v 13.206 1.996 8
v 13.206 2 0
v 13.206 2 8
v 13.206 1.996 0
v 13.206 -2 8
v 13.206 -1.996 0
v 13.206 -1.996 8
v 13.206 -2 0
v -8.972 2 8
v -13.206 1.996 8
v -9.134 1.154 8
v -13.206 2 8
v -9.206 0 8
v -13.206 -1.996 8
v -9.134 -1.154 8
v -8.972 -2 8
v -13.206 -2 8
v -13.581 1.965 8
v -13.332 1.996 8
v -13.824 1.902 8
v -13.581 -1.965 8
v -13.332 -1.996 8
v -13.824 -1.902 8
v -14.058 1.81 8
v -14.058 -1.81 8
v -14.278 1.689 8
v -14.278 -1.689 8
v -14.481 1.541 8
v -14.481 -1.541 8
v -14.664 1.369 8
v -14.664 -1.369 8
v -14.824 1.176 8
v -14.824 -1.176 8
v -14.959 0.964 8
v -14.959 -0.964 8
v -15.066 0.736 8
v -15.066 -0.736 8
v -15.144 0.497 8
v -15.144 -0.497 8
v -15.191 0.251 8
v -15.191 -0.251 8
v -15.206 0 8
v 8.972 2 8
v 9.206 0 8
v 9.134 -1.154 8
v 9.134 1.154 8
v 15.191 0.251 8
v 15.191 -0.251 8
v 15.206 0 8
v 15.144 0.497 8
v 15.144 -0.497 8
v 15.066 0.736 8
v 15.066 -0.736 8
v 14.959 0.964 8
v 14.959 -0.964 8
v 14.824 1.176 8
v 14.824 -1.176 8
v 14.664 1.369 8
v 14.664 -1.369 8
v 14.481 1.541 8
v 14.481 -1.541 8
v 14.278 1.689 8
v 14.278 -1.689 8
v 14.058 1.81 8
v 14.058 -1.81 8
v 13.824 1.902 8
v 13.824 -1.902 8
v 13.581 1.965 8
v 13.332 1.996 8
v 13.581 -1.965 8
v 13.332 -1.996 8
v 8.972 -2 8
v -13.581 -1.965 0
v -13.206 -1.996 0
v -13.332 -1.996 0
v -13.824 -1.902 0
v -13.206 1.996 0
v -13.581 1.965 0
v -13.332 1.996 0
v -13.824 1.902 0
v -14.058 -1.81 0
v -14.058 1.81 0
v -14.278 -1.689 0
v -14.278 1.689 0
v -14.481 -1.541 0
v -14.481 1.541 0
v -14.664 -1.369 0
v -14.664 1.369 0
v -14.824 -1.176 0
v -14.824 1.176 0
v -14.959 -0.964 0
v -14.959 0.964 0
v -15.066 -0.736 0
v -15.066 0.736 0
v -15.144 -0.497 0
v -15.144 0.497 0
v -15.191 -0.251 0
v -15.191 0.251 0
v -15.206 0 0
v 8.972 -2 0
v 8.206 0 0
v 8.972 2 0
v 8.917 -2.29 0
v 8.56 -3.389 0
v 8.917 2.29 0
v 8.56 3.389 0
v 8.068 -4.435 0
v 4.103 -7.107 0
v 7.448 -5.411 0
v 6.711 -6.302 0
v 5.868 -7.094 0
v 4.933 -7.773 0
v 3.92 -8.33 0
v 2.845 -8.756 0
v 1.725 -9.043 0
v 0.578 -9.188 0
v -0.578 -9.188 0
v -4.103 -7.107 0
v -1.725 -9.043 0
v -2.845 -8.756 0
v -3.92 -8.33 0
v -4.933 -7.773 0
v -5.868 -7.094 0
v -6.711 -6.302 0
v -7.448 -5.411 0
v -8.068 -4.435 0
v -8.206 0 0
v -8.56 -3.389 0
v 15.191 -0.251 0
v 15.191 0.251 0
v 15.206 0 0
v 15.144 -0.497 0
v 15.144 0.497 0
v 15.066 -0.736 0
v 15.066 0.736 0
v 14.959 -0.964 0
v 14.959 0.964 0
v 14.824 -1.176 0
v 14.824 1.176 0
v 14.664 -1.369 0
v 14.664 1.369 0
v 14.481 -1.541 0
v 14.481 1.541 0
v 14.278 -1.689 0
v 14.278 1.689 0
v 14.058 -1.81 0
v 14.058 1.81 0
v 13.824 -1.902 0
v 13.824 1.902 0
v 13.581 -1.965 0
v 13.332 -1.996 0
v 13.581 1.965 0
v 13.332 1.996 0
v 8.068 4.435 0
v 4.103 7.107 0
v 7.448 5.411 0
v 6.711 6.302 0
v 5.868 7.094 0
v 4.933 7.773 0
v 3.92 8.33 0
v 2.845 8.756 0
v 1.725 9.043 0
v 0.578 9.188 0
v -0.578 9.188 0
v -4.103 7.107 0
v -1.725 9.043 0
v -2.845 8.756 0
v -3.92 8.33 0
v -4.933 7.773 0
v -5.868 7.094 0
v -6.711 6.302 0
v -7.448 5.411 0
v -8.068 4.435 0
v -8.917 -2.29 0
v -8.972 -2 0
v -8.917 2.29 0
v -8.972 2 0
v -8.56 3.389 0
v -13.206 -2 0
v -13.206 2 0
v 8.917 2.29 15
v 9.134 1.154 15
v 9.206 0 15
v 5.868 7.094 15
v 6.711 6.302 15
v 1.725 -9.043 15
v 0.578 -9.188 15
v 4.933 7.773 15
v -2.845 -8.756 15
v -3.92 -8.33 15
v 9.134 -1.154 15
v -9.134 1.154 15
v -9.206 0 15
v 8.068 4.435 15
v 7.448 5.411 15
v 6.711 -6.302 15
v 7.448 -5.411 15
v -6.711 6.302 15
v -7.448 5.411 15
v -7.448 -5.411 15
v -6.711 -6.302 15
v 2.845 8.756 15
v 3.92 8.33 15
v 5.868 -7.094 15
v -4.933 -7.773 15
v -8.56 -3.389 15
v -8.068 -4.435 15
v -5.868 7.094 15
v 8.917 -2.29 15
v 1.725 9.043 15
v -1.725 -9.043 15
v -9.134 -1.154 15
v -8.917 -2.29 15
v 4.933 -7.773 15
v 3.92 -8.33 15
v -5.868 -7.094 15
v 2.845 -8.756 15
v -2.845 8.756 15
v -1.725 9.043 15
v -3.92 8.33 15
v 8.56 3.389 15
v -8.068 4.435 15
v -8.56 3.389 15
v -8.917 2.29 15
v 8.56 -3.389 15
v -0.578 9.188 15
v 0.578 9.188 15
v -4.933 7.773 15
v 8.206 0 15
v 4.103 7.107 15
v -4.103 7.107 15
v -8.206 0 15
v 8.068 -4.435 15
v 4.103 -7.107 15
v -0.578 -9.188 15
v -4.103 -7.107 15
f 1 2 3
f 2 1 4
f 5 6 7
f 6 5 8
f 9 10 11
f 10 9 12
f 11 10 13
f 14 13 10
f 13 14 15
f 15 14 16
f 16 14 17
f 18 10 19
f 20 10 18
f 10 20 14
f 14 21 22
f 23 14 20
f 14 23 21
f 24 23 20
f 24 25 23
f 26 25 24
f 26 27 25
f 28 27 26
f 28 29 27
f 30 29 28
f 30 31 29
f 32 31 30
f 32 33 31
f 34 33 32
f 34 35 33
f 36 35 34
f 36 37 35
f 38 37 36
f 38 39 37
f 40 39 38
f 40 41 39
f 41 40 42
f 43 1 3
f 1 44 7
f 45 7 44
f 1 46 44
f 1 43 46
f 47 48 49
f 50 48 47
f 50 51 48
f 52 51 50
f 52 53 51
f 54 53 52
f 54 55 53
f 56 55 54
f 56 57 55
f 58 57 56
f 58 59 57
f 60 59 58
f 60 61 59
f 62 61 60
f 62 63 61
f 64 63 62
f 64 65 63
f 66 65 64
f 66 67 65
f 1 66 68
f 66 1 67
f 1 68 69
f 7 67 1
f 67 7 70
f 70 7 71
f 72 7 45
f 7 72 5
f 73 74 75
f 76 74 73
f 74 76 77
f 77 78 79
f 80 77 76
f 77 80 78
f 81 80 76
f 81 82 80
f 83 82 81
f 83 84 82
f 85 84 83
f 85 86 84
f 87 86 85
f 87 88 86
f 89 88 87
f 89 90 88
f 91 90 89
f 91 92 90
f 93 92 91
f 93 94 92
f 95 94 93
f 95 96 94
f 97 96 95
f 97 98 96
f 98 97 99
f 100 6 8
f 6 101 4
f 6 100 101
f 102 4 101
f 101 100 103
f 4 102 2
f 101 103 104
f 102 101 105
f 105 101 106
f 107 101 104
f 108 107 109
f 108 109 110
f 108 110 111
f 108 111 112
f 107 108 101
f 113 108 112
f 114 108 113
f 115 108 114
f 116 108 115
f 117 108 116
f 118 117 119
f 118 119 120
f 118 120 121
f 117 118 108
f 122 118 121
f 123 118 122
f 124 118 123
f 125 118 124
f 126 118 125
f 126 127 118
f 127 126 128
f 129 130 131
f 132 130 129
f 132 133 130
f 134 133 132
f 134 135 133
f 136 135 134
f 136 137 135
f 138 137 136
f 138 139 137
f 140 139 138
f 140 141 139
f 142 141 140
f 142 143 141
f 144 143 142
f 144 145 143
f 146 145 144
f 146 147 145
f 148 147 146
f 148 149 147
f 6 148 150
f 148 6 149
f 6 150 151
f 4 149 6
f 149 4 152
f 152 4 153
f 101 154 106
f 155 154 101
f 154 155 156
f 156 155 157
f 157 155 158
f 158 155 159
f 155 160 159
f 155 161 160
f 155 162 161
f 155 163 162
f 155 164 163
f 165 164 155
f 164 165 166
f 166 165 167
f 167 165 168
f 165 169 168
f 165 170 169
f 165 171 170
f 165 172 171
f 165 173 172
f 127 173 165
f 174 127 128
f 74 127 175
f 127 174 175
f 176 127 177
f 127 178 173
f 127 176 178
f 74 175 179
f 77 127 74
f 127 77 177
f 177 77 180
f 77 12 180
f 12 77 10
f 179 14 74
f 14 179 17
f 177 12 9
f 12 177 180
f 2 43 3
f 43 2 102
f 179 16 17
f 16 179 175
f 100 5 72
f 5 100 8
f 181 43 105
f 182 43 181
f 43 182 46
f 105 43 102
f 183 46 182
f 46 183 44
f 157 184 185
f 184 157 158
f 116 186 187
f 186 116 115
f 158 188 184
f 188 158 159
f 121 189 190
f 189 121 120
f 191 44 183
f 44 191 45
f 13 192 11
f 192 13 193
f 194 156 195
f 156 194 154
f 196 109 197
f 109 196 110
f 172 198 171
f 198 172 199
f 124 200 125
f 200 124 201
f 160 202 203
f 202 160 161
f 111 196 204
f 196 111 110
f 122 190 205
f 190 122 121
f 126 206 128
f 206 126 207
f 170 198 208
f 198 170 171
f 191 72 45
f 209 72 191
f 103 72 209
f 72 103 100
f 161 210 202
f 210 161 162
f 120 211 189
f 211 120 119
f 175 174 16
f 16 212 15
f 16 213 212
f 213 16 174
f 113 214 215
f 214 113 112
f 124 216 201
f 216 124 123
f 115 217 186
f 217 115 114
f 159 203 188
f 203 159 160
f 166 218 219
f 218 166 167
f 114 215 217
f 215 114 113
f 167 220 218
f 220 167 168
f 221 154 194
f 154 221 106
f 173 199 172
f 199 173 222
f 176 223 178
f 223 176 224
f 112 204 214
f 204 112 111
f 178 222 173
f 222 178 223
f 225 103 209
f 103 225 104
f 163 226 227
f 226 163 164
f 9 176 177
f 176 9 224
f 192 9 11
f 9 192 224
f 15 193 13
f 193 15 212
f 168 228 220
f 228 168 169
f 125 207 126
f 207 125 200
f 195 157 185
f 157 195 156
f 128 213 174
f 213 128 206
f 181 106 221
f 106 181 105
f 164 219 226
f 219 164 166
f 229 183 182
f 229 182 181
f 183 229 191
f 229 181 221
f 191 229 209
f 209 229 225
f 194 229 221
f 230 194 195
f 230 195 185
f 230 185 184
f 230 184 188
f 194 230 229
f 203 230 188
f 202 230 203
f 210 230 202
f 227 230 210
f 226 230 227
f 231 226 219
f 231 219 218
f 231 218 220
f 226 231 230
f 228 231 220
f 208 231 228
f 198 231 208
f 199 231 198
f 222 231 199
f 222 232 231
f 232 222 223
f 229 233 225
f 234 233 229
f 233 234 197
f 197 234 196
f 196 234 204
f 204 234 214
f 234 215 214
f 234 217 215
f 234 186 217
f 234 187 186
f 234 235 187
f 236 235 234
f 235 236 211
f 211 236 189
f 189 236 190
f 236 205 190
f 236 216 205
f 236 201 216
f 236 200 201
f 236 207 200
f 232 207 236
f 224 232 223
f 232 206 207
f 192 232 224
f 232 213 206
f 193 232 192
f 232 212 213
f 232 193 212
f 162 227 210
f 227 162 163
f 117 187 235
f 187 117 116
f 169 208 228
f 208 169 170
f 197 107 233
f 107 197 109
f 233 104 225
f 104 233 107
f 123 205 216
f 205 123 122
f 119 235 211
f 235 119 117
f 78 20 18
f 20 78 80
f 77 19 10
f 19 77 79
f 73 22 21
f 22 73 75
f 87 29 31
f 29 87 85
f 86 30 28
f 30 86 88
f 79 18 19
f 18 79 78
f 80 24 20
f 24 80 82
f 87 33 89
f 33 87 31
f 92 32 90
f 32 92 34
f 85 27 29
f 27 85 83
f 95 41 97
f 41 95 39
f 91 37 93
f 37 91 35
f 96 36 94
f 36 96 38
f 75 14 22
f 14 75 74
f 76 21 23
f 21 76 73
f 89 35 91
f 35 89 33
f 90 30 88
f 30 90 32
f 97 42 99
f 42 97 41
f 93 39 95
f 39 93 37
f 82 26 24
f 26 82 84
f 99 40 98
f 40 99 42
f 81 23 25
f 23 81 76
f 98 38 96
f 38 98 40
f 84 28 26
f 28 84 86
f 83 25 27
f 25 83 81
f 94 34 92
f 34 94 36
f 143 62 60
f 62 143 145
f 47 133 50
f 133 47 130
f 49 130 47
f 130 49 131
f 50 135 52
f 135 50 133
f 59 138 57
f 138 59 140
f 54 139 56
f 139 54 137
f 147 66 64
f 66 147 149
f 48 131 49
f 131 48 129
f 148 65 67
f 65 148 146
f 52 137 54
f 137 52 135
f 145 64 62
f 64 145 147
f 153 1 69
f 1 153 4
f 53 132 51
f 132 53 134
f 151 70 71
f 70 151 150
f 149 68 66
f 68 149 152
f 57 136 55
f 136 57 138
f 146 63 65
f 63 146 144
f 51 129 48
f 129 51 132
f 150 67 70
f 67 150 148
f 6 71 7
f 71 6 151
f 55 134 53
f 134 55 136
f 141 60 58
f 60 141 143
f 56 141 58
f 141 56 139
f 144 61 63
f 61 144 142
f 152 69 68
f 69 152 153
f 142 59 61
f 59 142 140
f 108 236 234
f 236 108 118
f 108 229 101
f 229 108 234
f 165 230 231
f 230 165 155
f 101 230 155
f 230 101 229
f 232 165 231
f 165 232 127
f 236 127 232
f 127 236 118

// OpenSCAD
/* This is the hex size in mm */
size = 13.8;

/* This is the total height of the tool */
height = 15;

/* No need to touch this stuff... */
$fn = 50;
d = 2*1.03*size/sqrt(3);
handle_total_l = d+2+4*2;
handleh = 8;
handle_thick = 4;

difference(){
    union(){
        translate([-handle_total_l/2,-handle_thick/2,0])cube([handle_total_l,handle_thick,handleh]);
        cylinder(h = height, d=d+2);
        translate([-handle_total_l/2,0,0])cylinder(d = handle_thick, h = handleh);
        translate([handle_total_l/2,0,0])cylinder(d = handle_thick, h = handleh);
    }
    cylinder($fn = 6, h = height, d=d);
}
